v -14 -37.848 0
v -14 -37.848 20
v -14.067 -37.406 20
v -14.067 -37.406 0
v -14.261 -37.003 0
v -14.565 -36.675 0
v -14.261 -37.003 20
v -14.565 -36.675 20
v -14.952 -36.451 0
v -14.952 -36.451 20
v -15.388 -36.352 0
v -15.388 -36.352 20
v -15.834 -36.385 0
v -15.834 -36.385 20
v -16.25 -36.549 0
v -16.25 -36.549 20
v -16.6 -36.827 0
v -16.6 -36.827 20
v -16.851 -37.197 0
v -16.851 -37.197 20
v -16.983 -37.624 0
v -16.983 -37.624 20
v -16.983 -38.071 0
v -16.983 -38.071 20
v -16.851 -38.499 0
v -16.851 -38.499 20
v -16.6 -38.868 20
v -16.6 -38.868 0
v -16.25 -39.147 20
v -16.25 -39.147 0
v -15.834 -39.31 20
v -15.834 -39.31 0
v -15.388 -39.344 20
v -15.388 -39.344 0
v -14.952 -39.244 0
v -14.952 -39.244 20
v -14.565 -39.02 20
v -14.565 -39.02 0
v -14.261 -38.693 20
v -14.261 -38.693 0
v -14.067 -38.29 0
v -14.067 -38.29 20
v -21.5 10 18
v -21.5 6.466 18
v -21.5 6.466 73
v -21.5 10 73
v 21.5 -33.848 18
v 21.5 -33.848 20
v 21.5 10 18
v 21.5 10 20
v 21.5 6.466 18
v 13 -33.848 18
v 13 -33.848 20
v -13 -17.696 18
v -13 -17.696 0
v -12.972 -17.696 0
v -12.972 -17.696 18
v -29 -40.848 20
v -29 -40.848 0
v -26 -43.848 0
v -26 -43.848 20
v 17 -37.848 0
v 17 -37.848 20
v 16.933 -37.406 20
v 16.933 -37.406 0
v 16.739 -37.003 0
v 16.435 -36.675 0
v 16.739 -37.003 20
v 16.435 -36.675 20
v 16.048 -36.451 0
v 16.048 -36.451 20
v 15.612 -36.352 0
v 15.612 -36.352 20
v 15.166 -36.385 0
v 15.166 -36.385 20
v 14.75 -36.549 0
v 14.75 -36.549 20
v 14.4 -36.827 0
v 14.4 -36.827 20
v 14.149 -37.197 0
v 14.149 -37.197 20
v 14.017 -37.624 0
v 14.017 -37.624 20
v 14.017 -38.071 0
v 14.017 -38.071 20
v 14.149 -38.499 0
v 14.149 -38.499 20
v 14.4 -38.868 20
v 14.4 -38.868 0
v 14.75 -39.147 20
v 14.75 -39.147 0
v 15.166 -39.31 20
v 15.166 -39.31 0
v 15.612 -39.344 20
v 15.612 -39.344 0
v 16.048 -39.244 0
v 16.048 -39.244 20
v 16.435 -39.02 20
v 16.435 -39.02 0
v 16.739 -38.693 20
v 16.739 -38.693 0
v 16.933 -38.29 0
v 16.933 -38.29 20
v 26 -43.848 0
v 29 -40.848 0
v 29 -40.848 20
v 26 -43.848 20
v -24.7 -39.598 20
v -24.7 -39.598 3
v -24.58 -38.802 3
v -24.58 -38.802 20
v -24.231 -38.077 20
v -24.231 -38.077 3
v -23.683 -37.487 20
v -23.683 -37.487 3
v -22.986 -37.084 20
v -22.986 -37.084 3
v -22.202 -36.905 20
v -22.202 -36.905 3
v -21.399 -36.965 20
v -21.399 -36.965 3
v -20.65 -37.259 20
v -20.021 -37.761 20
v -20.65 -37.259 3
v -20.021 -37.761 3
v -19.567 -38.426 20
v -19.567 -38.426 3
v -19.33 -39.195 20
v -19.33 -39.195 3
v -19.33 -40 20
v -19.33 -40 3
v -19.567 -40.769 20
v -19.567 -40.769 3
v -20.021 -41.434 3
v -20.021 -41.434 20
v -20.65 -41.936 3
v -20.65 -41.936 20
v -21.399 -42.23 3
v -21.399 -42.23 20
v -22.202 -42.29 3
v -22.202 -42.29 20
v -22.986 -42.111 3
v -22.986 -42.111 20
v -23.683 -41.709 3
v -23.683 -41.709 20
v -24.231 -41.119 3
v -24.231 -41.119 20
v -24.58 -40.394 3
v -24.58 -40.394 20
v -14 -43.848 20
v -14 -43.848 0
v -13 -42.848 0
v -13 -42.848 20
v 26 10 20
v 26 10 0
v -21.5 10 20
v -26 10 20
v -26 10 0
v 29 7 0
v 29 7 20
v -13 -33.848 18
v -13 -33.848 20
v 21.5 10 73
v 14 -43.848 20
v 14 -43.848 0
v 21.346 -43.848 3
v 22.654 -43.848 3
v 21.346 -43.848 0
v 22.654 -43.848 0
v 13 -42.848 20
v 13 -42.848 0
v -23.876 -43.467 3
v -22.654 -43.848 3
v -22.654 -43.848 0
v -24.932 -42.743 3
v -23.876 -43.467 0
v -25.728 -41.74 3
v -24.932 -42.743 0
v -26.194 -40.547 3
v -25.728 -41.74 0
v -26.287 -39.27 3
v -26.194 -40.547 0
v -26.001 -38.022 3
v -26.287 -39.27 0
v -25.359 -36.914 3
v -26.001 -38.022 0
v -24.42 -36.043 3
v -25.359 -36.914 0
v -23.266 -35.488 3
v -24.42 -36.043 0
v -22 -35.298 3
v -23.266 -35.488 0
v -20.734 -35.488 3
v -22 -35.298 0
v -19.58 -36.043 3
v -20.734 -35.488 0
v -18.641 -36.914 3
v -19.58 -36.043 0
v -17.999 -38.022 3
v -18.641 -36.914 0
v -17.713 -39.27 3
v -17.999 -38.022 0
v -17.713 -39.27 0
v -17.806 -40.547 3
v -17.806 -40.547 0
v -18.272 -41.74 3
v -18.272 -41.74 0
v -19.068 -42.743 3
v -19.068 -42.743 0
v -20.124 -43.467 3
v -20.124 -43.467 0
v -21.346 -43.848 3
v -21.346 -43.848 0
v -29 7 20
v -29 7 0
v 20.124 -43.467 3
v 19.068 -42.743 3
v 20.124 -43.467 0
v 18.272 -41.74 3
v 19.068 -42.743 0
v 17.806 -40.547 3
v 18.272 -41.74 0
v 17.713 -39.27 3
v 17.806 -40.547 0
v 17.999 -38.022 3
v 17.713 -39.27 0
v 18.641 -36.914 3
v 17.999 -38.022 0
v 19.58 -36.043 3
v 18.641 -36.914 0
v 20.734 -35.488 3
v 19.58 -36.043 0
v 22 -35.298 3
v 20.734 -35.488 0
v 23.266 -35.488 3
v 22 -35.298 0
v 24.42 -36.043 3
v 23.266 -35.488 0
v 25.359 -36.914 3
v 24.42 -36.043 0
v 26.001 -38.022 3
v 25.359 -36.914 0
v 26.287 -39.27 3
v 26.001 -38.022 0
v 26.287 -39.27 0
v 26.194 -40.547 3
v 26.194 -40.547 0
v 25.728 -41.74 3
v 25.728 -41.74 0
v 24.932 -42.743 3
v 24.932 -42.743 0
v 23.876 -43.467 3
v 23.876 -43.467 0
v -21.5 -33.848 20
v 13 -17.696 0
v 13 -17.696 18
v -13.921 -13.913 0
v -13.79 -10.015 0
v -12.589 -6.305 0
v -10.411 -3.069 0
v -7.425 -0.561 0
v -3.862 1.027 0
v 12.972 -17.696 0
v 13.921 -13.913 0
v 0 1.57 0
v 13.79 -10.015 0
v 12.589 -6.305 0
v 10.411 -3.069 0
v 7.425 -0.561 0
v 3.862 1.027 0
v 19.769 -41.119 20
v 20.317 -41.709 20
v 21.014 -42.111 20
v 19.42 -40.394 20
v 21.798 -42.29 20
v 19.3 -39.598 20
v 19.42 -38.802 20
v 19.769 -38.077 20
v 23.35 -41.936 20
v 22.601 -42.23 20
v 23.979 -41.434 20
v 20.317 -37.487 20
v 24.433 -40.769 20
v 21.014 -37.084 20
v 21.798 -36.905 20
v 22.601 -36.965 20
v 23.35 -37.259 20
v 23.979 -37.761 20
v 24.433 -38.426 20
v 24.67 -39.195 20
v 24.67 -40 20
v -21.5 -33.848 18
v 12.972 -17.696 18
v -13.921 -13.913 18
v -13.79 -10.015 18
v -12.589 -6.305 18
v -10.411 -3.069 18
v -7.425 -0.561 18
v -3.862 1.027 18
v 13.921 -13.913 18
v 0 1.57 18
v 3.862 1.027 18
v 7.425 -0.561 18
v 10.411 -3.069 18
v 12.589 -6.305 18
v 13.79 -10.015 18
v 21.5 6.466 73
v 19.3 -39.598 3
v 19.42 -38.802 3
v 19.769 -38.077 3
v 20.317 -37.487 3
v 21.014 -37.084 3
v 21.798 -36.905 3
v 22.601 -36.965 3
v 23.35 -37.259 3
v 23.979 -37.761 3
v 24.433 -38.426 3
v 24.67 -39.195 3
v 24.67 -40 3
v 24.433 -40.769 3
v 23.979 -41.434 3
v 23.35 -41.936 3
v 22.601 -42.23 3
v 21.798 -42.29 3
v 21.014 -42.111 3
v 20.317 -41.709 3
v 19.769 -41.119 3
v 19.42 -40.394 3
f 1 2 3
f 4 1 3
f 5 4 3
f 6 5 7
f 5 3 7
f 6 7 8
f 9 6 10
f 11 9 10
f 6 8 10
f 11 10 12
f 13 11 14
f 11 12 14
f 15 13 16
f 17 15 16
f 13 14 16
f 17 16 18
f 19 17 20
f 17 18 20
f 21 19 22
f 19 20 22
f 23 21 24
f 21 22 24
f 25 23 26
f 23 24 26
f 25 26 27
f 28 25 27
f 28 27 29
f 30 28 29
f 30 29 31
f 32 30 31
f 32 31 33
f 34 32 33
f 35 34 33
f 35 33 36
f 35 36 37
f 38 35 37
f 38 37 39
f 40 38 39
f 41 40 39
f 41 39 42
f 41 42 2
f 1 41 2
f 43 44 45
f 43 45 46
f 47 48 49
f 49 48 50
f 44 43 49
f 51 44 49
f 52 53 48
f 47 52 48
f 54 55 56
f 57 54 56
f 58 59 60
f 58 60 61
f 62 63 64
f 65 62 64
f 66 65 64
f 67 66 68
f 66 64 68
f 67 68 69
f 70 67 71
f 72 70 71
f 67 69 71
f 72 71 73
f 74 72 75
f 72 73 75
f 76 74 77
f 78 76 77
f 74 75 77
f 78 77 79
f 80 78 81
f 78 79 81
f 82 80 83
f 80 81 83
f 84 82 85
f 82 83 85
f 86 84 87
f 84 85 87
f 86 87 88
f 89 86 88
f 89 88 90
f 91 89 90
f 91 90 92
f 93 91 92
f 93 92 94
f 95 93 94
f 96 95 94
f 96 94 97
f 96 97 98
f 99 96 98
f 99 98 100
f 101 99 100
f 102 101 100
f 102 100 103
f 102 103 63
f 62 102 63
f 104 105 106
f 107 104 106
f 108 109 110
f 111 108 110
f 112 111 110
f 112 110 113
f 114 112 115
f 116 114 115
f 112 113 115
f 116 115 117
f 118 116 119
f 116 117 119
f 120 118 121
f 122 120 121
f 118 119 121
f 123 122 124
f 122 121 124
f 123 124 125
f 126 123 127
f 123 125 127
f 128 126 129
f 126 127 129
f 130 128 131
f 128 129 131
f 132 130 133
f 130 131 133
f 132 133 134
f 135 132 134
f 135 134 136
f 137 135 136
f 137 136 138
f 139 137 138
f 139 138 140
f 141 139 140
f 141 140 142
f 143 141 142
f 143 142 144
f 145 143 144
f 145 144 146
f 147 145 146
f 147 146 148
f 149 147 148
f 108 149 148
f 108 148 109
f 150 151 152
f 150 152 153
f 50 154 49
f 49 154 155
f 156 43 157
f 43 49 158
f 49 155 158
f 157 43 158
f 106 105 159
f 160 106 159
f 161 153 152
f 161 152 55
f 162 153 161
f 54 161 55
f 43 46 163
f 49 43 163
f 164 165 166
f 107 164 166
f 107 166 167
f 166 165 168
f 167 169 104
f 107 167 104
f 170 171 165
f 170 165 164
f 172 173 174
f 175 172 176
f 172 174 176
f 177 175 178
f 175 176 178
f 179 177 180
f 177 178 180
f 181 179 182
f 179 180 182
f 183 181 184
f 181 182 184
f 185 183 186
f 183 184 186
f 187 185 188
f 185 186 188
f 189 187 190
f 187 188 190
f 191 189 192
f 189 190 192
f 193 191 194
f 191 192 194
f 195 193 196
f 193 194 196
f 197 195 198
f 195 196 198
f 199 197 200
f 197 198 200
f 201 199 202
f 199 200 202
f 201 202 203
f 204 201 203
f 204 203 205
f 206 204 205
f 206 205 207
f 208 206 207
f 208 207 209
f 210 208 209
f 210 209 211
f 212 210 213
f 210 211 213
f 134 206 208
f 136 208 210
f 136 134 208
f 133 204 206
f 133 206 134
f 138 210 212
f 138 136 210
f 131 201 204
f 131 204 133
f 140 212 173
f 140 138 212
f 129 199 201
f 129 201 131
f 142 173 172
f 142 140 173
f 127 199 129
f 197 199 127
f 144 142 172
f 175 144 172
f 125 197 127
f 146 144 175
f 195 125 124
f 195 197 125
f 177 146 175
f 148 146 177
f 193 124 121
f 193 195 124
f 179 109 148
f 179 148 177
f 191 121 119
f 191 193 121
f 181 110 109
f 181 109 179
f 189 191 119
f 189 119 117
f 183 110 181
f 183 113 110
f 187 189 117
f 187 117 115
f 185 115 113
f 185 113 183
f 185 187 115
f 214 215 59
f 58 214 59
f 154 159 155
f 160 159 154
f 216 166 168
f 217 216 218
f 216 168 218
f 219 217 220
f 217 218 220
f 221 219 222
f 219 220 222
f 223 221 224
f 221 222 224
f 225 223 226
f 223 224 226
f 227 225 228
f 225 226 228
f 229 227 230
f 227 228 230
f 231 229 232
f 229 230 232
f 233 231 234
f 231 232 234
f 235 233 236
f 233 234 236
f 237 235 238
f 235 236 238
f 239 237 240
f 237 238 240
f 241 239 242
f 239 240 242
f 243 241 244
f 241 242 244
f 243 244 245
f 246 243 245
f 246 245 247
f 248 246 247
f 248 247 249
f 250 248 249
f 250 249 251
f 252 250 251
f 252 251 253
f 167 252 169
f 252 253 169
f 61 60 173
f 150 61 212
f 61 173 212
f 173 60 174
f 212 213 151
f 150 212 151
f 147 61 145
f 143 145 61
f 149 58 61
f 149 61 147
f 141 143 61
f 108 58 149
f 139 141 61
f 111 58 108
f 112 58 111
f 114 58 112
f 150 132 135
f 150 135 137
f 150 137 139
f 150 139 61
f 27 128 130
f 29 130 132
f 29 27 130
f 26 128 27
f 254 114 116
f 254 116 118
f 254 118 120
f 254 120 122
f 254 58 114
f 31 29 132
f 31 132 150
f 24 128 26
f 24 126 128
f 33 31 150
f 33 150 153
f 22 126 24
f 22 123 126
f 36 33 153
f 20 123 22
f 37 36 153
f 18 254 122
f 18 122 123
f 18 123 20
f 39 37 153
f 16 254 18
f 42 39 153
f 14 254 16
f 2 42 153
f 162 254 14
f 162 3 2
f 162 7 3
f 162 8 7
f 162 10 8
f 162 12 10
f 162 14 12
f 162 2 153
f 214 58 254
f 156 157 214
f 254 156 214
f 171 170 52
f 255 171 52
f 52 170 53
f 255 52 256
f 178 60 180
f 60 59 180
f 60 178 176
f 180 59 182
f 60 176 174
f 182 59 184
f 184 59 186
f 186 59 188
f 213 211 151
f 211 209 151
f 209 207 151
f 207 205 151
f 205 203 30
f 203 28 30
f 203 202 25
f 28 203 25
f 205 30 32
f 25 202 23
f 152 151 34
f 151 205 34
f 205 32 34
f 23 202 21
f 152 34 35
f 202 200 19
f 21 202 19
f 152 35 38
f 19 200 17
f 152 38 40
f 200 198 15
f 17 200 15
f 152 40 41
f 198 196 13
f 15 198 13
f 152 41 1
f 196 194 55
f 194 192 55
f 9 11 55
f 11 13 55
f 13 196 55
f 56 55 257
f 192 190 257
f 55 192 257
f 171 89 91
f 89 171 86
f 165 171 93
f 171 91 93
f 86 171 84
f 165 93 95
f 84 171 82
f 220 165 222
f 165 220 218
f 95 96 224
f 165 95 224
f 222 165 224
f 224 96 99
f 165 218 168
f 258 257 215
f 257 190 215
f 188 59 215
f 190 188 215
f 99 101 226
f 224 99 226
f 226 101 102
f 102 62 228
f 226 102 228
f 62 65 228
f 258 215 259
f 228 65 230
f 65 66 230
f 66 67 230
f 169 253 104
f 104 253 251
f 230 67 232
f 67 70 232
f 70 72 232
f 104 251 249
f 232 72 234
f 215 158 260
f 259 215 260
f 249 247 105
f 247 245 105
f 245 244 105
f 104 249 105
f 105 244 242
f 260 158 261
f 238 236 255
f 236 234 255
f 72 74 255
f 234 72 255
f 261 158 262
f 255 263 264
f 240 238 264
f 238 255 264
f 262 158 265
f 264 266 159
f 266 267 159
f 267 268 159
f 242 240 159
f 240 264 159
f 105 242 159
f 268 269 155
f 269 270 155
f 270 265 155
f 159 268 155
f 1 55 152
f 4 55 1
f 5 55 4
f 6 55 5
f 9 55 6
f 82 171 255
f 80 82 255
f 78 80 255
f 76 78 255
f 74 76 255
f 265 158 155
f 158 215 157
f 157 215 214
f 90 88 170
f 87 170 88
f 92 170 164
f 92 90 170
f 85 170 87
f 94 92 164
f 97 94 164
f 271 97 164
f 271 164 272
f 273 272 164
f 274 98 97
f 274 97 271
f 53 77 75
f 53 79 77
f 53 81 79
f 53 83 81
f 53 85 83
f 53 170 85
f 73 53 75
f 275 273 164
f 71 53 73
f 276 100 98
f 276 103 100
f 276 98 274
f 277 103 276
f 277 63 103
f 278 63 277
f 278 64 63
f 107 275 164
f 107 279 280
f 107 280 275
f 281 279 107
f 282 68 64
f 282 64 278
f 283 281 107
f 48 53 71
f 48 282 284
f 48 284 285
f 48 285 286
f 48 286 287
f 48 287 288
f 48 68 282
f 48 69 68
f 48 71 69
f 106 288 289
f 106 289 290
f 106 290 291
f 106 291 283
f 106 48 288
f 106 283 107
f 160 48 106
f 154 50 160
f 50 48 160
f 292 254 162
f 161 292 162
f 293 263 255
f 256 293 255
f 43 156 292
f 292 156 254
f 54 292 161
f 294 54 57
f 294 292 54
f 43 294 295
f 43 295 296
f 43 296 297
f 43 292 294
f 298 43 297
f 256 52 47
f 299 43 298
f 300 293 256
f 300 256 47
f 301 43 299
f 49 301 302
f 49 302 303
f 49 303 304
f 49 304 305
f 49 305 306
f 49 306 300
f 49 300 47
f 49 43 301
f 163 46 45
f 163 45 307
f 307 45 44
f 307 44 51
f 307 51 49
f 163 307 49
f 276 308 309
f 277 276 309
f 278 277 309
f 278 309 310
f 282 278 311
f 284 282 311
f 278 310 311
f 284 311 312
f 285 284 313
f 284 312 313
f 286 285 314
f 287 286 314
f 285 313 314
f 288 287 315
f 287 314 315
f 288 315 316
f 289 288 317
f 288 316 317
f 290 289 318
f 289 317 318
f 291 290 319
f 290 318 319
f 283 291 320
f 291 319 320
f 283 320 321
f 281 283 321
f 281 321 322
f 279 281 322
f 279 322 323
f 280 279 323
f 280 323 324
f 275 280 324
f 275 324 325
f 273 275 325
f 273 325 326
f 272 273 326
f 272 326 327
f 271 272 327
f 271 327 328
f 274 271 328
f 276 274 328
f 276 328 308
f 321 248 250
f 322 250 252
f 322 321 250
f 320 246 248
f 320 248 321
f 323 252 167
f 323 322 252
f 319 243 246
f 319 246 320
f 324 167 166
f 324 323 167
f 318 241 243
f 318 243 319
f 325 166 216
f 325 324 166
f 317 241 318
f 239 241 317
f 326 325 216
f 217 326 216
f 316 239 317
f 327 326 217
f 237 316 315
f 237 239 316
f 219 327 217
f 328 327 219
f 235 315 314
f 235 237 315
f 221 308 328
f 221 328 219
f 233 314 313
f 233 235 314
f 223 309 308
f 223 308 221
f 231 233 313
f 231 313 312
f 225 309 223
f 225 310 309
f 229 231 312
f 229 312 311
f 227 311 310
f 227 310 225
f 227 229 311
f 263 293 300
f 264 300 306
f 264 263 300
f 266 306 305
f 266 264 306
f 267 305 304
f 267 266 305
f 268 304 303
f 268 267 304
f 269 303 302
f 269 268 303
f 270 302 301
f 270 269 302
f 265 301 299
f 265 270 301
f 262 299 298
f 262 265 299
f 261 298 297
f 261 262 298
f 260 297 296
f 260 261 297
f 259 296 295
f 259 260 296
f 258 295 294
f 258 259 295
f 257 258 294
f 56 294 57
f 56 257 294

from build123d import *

# Parameters (mm, degrees)
SKETCH1_R           = 14
BOSS_EXTRUDE1_DEPTH = 20
CUT_EXTRUDE2_REACH  = 22
SKETCH3_R           = 2.7
SKETCH4_R           = 4.3
CUT_EXTRUDE3_DEPTH  = 3
CHAMFER1_SIZE       = 3
CUT_EXTRUDE4_DEPTH  = 2
CUT_EXTRUDE5_REACH  = 22
SKETCH6_W           = 26
SKETCH6_H           = 52.303158924
CHAMFER2_SIZE       = 1
SKETCH9_W           = 43
SKETCH9_H           = 3.534032063
BOSS_EXTRUDE2_DEPTH = 55
SKETCH10_R          = 1.5
CUT_EXTRUDE6_DEPTH  = 21


with BuildPart() as part:
    # Sketch1 → Boss-Extrude1 (new body)
    with BuildSketch(Plane.XY):
        Polygon((29, 10), (-29, 10), (-29, 0), (-29, -43.847708304), (29, -43.847708304), (29, 0), align=None)
        with Locations((0, -12.429722781)):
            Circle(SKETCH1_R, mode=Mode.SUBTRACT)
    extrude(amount=BOSS_EXTRUDE1_DEPTH)

    # Sketch3 → Cut-Extrude2 (cut, up to next)
    with BuildSketch(Plane(origin=(0, 0, 0), x_dir=(-1, 0, 0), z_dir=(0, 0, -1)), mode=Mode.PRIVATE) as cut_extrude2_sk1:
        with Locations((-22, -39.597708304)):
            Circle(SKETCH3_R)
    cut_extrude2_tool1 = extrude(cut_extrude2_sk1.sketch, amount=-CUT_EXTRUDE2_REACH, mode=Mode.PRIVATE) & part.part
    add(cut_extrude2_tool1.solids().sort_by_distance((22, -39.597708, 0))[0], mode=Mode.SUBTRACT)
    # Sketch3 → Cut-Extrude2 (cut, up to next)
    with BuildSketch(Plane(origin=(0, 0, 0), x_dir=(-1, 0, 0), z_dir=(0, 0, -1)), mode=Mode.PRIVATE) as cut_extrude2_sk2:
        with Locations((22, -39.597708304)):
            Circle(SKETCH3_R)
    cut_extrude2_tool2 = extrude(cut_extrude2_sk2.sketch, amount=-CUT_EXTRUDE2_REACH, mode=Mode.PRIVATE) & part.part
    add(cut_extrude2_tool2.solids().sort_by_distance((-22, -39.597708, 0))[0], mode=Mode.SUBTRACT)

    # Sketch4 → Cut-Extrude3 (cut)
    with BuildSketch(Plane(origin=(0, 0, 0), x_dir=(-1, 0, 0), z_dir=(0, 0, -1))):
        with Locations((-22, -39.597708304)):
            Circle(SKETCH4_R)
        with Locations((22, -39.597708304)):
            Circle(SKETCH4_R)
    extrude(amount=-CUT_EXTRUDE3_DEPTH, mode=Mode.SUBTRACT)

    # Chamfer1
    chamfer1_edges = [part.edges().sort_by_distance(p)[0] for p in [
        (-29, 10, 10),
        (29, 10, 10),
        (29, -43.847708304, 10),
        (-29, -43.847708304, 10),
    ]]
    chamfer(chamfer1_edges, length=CHAMFER1_SIZE)

    # Sketch5 → Cut-Extrude4 (cut)
    with BuildSketch(Plane.XY.offset(20)):
        Polygon((0, 25.079245902), (-21.5, 10), (-21.5, -33.847708304), (21.5, -33.847708304), (21.5, 10), align=None)
    extrude(amount=-CUT_EXTRUDE4_DEPTH, mode=Mode.SUBTRACT)

    # Sketch6 → Cut-Extrude5 (cut, up to next)
    with BuildSketch(Plane.XY.offset(20), mode=Mode.PRIVATE) as cut_extrude5_sk1:
        with Locations((0, -43.847708304)):
            Rectangle(SKETCH6_W, SKETCH6_H)
    cut_extrude5_tool1 = extrude(cut_extrude5_sk1.sketch, amount=-CUT_EXTRUDE5_REACH, mode=Mode.PRIVATE) & part.part
    add(cut_extrude5_tool1.solids().sort_by_distance((0, -43.847708, 20))[0], mode=Mode.SUBTRACT)

    # Chamfer2
    chamfer2_edges = [part.edges().sort_by_distance(p)[0] for p in [
        (13, -43.847708304, 10),
        (-13, -43.847708304, 10),
    ]]
    chamfer(chamfer2_edges, length=CHAMFER2_SIZE)

    # Sketch10 → Cut-Extrude6 (cut, through all)
    with BuildSketch(Plane.XY.offset(20)):
        with Locations((-15.5, -37.847708304)):
            Circle(SKETCH10_R)
        with Locations((15.5, -37.847708304)):
            Circle(SKETCH10_R)
    extrude(amount=-CUT_EXTRUDE6_DEPTH, mode=Mode.SUBTRACT)


with BuildPart() as body_2:
    # Sketch9 → Boss-Extrude2 (new body)
    with BuildSketch(Plane.XY.offset(18)):
        with Locations((0, 8.232983969)):
            Rectangle(SKETCH9_W, SKETCH9_H)
    extrude(amount=BOSS_EXTRUDE2_DEPTH)


solid = Compound([part.part, body_2.part])
